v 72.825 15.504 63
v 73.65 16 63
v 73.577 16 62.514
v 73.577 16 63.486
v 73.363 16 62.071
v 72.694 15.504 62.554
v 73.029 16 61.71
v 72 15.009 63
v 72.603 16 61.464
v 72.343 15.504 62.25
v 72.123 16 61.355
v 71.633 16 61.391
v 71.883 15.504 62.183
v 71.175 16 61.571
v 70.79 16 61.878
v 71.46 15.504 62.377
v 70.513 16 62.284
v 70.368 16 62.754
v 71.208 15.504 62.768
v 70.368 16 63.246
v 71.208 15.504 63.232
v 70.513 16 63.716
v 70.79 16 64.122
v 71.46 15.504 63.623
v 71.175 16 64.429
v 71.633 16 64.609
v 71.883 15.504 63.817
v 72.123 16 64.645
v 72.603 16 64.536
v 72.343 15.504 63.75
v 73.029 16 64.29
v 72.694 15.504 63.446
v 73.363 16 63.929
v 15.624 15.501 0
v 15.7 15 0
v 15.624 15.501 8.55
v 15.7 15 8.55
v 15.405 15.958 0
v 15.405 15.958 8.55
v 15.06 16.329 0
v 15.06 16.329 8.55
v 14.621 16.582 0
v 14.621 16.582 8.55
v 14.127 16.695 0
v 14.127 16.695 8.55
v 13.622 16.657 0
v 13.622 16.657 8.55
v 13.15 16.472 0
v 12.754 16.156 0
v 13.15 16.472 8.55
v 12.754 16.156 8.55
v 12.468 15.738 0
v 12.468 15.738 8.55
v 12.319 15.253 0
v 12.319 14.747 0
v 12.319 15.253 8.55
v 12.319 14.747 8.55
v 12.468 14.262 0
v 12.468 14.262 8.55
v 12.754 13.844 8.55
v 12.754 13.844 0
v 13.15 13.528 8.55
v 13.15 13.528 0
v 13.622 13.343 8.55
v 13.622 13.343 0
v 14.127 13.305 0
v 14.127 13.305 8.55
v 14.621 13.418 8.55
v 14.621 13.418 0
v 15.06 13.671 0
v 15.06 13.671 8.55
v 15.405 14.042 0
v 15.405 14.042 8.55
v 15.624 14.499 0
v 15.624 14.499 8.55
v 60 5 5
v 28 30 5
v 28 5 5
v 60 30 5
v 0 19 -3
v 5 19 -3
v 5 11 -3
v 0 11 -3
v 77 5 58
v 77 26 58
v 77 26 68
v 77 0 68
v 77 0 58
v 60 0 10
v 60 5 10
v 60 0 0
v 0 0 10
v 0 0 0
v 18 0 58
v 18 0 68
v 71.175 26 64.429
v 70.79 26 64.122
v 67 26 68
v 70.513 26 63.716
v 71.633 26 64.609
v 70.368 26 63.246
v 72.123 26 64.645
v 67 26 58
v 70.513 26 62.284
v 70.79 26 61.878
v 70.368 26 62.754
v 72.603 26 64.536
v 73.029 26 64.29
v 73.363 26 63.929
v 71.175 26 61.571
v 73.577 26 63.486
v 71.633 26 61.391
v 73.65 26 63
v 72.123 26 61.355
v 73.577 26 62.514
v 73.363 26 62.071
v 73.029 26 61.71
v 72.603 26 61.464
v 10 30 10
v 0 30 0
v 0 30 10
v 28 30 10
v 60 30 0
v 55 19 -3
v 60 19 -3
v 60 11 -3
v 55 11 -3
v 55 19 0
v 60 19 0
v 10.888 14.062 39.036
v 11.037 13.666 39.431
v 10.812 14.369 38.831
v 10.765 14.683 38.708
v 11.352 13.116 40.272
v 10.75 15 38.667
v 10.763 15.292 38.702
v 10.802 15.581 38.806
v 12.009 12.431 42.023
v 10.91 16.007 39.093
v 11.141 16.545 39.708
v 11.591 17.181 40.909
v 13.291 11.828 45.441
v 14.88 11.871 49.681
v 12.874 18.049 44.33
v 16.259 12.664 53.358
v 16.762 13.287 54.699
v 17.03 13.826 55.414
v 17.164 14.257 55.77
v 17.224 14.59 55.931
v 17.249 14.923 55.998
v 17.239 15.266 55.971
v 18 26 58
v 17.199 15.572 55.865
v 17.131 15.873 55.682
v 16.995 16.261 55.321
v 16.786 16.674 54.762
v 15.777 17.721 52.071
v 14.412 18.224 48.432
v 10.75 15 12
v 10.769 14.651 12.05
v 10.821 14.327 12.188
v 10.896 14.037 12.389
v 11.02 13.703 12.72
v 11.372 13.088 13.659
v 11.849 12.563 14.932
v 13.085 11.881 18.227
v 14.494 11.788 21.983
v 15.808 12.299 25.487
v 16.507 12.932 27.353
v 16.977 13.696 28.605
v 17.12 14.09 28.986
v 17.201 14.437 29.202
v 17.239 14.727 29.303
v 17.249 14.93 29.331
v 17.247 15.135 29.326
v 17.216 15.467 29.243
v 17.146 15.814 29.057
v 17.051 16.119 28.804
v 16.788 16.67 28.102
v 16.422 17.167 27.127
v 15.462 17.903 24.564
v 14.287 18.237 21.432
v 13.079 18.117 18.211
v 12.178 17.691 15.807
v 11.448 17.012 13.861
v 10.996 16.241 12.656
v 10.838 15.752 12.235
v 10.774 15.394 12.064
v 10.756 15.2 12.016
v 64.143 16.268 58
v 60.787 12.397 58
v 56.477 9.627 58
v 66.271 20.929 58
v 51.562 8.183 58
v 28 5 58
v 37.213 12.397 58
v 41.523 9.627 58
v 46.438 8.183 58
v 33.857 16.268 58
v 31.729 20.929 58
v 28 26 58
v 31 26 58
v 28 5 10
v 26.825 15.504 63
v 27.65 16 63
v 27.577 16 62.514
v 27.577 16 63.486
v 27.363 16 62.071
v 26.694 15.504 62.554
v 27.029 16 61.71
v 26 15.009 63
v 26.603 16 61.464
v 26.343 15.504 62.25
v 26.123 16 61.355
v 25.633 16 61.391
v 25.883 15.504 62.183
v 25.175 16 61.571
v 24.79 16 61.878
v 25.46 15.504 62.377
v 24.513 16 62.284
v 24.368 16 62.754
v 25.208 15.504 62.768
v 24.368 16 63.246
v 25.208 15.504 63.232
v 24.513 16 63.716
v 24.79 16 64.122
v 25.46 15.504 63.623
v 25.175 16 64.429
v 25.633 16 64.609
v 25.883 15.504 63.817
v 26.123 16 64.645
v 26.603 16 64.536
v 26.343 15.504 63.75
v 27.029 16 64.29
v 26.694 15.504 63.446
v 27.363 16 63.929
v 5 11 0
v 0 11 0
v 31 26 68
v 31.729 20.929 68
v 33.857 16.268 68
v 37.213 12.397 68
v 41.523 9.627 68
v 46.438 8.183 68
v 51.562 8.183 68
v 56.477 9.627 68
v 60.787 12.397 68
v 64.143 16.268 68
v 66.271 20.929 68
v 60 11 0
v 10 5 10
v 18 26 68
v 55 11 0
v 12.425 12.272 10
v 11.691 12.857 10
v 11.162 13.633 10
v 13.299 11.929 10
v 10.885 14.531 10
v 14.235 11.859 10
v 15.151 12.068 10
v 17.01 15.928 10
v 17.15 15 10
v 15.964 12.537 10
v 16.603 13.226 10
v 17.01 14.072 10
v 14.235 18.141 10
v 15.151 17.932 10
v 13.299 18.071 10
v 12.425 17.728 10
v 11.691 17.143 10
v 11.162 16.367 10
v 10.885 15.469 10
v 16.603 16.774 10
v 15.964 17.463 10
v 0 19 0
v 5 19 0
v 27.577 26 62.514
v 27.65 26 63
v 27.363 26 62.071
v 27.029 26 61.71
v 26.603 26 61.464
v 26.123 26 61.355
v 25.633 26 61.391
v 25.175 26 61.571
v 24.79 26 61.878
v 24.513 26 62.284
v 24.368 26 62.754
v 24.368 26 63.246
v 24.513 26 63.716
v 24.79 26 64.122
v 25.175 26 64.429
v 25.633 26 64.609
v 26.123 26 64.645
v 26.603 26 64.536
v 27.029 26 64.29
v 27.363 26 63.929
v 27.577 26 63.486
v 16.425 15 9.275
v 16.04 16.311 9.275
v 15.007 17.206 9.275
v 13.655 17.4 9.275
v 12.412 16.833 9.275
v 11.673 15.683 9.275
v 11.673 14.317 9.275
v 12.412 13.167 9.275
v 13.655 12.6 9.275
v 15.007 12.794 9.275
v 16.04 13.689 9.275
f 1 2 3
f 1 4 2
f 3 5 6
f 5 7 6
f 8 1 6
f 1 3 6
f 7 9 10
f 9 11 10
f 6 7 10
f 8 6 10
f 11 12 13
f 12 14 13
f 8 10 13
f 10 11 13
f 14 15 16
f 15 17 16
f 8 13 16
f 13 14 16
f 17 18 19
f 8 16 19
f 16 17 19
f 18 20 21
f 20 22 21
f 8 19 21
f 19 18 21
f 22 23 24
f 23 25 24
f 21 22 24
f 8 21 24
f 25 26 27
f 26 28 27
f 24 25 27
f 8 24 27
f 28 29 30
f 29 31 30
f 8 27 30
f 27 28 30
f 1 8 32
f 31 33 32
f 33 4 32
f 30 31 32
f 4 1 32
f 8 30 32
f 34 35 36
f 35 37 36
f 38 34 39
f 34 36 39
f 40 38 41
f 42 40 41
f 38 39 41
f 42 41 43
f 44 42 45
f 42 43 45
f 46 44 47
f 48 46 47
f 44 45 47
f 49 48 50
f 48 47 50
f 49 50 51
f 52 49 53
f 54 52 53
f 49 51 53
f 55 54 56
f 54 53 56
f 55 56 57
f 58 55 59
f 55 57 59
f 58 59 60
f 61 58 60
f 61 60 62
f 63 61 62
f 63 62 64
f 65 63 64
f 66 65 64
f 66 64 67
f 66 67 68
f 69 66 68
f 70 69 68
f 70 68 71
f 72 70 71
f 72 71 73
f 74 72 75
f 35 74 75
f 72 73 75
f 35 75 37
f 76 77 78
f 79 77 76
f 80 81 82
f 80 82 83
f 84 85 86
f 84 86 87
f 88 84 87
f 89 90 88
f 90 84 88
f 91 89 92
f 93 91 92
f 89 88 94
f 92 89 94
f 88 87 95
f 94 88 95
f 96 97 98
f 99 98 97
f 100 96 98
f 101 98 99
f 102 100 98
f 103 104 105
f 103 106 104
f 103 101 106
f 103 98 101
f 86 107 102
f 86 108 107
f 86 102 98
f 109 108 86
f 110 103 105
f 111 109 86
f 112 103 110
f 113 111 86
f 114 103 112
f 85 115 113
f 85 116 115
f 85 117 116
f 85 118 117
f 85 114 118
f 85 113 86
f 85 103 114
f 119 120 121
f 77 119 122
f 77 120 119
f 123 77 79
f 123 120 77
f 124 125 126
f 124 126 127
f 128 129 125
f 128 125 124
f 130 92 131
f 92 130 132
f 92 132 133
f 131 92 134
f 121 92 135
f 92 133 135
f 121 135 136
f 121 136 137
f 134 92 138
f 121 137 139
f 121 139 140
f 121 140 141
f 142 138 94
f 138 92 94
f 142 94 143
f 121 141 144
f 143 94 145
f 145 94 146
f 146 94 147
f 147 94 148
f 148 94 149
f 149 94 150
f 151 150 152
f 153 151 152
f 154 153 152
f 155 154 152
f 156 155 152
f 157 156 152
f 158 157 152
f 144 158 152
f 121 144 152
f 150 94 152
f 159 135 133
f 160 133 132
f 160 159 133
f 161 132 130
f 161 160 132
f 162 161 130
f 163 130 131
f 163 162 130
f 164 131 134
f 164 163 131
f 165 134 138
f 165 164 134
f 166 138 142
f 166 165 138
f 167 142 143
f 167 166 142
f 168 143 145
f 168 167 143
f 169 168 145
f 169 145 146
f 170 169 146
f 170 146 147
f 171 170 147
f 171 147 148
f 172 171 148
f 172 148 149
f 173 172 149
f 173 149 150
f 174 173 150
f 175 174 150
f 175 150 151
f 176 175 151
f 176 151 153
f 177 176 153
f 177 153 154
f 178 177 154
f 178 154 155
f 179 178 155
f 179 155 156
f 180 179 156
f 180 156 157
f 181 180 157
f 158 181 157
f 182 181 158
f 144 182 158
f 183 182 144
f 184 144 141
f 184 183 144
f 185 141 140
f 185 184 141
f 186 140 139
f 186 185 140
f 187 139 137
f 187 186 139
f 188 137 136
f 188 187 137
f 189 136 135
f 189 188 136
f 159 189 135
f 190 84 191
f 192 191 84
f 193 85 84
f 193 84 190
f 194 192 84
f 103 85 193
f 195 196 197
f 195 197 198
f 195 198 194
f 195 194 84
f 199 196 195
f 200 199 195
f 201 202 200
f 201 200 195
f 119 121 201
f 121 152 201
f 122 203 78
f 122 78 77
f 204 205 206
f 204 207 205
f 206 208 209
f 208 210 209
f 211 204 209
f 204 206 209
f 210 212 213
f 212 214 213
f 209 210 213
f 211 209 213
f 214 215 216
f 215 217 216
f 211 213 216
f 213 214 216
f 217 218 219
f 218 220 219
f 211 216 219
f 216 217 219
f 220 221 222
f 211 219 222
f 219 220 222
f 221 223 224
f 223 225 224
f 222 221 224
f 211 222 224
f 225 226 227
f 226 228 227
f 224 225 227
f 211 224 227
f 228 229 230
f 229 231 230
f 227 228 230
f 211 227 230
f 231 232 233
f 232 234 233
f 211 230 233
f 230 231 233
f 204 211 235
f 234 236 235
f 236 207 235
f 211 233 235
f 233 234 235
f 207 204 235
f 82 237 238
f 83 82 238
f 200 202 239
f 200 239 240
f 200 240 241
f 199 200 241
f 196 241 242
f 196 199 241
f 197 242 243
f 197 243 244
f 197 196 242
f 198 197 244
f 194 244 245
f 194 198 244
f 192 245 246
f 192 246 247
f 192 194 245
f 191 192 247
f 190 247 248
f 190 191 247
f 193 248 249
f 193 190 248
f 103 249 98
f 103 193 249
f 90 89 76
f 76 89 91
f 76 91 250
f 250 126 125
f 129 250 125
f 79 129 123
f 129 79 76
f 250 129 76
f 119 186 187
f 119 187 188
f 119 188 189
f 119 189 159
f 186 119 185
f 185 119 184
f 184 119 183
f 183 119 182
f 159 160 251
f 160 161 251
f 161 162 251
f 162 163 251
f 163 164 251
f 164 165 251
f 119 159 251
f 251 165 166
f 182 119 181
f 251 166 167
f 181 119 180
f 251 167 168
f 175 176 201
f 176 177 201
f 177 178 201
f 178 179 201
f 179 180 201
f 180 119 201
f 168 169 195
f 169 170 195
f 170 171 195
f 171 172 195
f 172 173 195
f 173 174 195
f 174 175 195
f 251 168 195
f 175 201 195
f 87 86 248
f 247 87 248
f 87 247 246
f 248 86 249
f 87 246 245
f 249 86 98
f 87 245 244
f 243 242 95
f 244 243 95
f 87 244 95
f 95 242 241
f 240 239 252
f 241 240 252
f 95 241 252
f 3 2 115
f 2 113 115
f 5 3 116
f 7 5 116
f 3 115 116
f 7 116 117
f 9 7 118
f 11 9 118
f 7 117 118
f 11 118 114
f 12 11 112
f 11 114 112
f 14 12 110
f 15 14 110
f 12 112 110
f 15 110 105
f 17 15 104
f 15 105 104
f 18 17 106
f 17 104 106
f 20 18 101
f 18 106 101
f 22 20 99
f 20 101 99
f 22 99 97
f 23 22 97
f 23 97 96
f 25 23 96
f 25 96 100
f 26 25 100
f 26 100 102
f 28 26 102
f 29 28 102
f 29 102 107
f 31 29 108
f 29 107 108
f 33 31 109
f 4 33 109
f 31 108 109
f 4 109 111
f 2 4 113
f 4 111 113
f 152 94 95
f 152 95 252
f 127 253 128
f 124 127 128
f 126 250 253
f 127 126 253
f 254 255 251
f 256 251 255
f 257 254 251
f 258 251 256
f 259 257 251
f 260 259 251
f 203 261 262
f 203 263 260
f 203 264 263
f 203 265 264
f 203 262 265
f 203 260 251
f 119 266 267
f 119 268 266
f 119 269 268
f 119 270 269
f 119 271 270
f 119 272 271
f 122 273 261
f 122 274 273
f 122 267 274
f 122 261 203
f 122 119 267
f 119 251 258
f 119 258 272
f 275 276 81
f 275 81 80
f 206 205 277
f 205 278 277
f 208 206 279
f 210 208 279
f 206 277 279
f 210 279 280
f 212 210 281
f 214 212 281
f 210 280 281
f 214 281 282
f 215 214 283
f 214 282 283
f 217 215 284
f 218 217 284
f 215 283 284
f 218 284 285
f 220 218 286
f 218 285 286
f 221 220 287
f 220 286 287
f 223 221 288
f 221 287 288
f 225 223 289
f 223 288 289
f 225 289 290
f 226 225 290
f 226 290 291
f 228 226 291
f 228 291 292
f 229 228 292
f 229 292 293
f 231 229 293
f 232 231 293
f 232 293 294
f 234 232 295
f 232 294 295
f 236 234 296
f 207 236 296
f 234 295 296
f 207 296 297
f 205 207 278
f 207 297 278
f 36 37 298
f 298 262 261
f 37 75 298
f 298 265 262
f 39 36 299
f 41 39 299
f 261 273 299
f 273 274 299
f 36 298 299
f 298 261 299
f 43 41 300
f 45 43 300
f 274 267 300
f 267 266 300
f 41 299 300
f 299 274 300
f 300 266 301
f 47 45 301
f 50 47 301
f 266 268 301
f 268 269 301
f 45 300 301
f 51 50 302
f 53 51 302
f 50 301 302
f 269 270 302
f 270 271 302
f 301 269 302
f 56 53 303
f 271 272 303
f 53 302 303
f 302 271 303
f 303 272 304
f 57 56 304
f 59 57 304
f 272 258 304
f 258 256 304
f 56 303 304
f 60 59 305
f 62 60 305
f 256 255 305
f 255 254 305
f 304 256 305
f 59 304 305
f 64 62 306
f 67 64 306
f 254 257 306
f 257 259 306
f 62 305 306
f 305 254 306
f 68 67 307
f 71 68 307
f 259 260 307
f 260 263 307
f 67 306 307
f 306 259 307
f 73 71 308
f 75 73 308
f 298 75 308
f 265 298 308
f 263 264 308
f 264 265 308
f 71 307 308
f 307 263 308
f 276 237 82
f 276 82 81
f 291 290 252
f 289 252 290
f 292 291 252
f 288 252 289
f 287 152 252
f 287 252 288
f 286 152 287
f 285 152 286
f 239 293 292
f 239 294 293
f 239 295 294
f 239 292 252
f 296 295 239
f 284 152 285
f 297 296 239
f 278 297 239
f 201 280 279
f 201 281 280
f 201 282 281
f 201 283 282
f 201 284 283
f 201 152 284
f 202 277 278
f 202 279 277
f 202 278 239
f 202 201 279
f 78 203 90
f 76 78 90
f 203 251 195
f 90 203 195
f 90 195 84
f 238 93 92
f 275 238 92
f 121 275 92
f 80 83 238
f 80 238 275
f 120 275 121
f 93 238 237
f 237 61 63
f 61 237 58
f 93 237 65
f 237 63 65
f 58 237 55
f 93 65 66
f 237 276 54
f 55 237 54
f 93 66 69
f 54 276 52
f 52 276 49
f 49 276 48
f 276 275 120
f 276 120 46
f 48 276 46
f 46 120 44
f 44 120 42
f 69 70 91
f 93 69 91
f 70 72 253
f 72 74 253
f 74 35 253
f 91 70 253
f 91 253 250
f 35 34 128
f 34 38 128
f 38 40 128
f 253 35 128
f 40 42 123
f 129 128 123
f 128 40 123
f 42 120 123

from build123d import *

# Parameters (mm, degrees)
SKETCH_1_W          = 60
SKETCH_1_H          = 30
EXTRUDE_1_DEPTH     = 10
SKETCH_2_W          = 42
SKETCH_2_H          = 42
CUT_EXTRUDE_1_DEPTH = 5
EXTRUDE_2_DEPTH     = 10
CUT_EXTRUDE_2_REACH = 102.96
SKETCH_8_R          = 3.25
SKETCH_9_W          = 5
SKETCH_9_H          = 8
EXTRUDE_3_DEPTH     = 3


# Read off the part's stored shape, not the designer's step: 高级异型孔1, 高级异型孔2
with BuildPart() as part:
    # 草图1 → 凸台-拉伸1 (new body)
    with BuildSketch(Plane.XY):
        with Locations((30, 15)):
            Rectangle(SKETCH_1_W, SKETCH_1_H)
    extrude(amount=EXTRUDE_1_DEPTH)

    # 草图2 → 切除-拉伸1 (cut)
    with BuildSketch(Plane.XY.offset(10)):
        with Locations((49, 26)):
            Rectangle(SKETCH_2_W, SKETCH_2_H)
    extrude(amount=-CUT_EXTRUDE_1_DEPTH, mode=Mode.SUBTRACT)



with BuildPart() as body_2:
    # 草图3 → 凸台-拉伸2 (new body)
    with BuildSketch(Plane.XY.offset(58)):
        with BuildLine():
            Line((18, 0), (18, 26))
            Line((18, 26), (31, 26))
            ThreePointArc((31, 26), (49, 8), (67, 26))
            Line((67, 26), (77, 26))
            Line((77, 26), (77, 0))
            Line((77, 0), (18, 0))
        make_face()
    extrude(amount=EXTRUDE_2_DEPTH)


with BuildPart() as part_1:
    add(part.part)

    add(body_2.part)  # 放样1 merges body 2
    # 草图5 → 放样1 section 0
    with BuildSketch(Plane.XY.offset(10)):
        with BuildLine():
            Line((60, 5), (60, 0))
            Line((60, 0), (0, 0))
            Line((0, 0), (0, 30))
            Line((0, 30), (10, 30))
            Line((10, 30), (10, 5))
            Line((10, 5), (60, 5))
        make_face()
    # 草图4 → 放样1 section 1
    with BuildSketch(Plane(origin=(0, 0, 58), x_dir=(-1, 0, 0), z_dir=(0, 0, -1))):
        with BuildLine():
            Line((-18, 26), (-18, 0))
            Line((-18, 0), (-77, 0))
            Line((-77, 0), (-77, 5))
            Line((-77, 5), (-28, 5))
            Line((-28, 5), (-28, 26))
            Line((-28, 26), (-18, 26))
        make_face()
    loft()

    # 高级异型孔1 outline → 高级异型孔1 (revolve, cut)
    with BuildSketch(Plane(origin=(14, 15, 0), x_dir=(1, 0, 0), z_dir=(0, -1, 0))):
        Polygon((3.15, 10), (0, 10), (0, 0), (1.7, 0), (1.7, 8.55), align=None)
    revolve(axis=Axis((14, 15, 0), (0, 0, 1)), mode=Mode.SUBTRACT)

    # 切除-拉伸2: up to this plane
    cut_extrude_2_end = Plane(origin=(-3.287671233, 0, 1.232876712), z_dir=(-0.9363291775690445, 0, 0.35112344158839154))
    # 草图8 → 切除-拉伸2 (cut, up to the surface)
    with BuildSketch(Plane.XY.offset(10), mode=Mode.PRIVATE) as cut_extrude_2_sk1:
        with Locations(Location((14, 15, 0), (0, 0, 180))):
            Circle(SKETCH_8_R)
    cut_extrude_2_tool1 = split(extrude(cut_extrude_2_sk1.sketch, amount=CUT_EXTRUDE_2_REACH, mode=Mode.PRIVATE), bisect_by=cut_extrude_2_end, keep=Keep.BOTH, mode=Mode.PRIVATE)
    add(cut_extrude_2_tool1.solids().sort_by_distance((14, 15, 10))[0], mode=Mode.SUBTRACT)

    # 草图9 → 凸台-拉伸3 (add)
    with BuildSketch(Plane(origin=(0, 0, 0), x_dir=(-1, 0, 0), z_dir=(0, 0, -1))):
        with Locations((-57.5, 15)):
            Rectangle(SKETCH_9_W, SKETCH_9_H)
        with Locations((-2.5, 15)):
            Rectangle(SKETCH_9_W, SKETCH_9_H)
    extrude(amount=EXTRUDE_3_DEPTH)

    # 高级异型孔2 outline → 高级异型孔2 (revolve, cut)
    with BuildSketch(Plane(origin=(72, 0, 63), x_dir=(1, 0, 0), z_dir=(0, 0, 1))):
        Polygon((0, 15.008579979), (1.65, 16), (1.65, 26), (0, 26), align=None)
    revolve(axis=Axis((72, 0, 63), (0, 1, 0)), mode=Mode.SUBTRACT)

    # Other 2 2 outline → Other 2 2 (revolve, cut)
    with BuildSketch(Plane(origin=(26, 0, 63), x_dir=(1, 0, 0), z_dir=(0, 0, 1))):
        Polygon((0, 15.008579979), (1.65, 16), (1.65, 26), (0, 26), align=None)
    revolve(axis=Axis((26, 0, 63), (0, 1, 0)), mode=Mode.SUBTRACT)


solid = part_1.part
